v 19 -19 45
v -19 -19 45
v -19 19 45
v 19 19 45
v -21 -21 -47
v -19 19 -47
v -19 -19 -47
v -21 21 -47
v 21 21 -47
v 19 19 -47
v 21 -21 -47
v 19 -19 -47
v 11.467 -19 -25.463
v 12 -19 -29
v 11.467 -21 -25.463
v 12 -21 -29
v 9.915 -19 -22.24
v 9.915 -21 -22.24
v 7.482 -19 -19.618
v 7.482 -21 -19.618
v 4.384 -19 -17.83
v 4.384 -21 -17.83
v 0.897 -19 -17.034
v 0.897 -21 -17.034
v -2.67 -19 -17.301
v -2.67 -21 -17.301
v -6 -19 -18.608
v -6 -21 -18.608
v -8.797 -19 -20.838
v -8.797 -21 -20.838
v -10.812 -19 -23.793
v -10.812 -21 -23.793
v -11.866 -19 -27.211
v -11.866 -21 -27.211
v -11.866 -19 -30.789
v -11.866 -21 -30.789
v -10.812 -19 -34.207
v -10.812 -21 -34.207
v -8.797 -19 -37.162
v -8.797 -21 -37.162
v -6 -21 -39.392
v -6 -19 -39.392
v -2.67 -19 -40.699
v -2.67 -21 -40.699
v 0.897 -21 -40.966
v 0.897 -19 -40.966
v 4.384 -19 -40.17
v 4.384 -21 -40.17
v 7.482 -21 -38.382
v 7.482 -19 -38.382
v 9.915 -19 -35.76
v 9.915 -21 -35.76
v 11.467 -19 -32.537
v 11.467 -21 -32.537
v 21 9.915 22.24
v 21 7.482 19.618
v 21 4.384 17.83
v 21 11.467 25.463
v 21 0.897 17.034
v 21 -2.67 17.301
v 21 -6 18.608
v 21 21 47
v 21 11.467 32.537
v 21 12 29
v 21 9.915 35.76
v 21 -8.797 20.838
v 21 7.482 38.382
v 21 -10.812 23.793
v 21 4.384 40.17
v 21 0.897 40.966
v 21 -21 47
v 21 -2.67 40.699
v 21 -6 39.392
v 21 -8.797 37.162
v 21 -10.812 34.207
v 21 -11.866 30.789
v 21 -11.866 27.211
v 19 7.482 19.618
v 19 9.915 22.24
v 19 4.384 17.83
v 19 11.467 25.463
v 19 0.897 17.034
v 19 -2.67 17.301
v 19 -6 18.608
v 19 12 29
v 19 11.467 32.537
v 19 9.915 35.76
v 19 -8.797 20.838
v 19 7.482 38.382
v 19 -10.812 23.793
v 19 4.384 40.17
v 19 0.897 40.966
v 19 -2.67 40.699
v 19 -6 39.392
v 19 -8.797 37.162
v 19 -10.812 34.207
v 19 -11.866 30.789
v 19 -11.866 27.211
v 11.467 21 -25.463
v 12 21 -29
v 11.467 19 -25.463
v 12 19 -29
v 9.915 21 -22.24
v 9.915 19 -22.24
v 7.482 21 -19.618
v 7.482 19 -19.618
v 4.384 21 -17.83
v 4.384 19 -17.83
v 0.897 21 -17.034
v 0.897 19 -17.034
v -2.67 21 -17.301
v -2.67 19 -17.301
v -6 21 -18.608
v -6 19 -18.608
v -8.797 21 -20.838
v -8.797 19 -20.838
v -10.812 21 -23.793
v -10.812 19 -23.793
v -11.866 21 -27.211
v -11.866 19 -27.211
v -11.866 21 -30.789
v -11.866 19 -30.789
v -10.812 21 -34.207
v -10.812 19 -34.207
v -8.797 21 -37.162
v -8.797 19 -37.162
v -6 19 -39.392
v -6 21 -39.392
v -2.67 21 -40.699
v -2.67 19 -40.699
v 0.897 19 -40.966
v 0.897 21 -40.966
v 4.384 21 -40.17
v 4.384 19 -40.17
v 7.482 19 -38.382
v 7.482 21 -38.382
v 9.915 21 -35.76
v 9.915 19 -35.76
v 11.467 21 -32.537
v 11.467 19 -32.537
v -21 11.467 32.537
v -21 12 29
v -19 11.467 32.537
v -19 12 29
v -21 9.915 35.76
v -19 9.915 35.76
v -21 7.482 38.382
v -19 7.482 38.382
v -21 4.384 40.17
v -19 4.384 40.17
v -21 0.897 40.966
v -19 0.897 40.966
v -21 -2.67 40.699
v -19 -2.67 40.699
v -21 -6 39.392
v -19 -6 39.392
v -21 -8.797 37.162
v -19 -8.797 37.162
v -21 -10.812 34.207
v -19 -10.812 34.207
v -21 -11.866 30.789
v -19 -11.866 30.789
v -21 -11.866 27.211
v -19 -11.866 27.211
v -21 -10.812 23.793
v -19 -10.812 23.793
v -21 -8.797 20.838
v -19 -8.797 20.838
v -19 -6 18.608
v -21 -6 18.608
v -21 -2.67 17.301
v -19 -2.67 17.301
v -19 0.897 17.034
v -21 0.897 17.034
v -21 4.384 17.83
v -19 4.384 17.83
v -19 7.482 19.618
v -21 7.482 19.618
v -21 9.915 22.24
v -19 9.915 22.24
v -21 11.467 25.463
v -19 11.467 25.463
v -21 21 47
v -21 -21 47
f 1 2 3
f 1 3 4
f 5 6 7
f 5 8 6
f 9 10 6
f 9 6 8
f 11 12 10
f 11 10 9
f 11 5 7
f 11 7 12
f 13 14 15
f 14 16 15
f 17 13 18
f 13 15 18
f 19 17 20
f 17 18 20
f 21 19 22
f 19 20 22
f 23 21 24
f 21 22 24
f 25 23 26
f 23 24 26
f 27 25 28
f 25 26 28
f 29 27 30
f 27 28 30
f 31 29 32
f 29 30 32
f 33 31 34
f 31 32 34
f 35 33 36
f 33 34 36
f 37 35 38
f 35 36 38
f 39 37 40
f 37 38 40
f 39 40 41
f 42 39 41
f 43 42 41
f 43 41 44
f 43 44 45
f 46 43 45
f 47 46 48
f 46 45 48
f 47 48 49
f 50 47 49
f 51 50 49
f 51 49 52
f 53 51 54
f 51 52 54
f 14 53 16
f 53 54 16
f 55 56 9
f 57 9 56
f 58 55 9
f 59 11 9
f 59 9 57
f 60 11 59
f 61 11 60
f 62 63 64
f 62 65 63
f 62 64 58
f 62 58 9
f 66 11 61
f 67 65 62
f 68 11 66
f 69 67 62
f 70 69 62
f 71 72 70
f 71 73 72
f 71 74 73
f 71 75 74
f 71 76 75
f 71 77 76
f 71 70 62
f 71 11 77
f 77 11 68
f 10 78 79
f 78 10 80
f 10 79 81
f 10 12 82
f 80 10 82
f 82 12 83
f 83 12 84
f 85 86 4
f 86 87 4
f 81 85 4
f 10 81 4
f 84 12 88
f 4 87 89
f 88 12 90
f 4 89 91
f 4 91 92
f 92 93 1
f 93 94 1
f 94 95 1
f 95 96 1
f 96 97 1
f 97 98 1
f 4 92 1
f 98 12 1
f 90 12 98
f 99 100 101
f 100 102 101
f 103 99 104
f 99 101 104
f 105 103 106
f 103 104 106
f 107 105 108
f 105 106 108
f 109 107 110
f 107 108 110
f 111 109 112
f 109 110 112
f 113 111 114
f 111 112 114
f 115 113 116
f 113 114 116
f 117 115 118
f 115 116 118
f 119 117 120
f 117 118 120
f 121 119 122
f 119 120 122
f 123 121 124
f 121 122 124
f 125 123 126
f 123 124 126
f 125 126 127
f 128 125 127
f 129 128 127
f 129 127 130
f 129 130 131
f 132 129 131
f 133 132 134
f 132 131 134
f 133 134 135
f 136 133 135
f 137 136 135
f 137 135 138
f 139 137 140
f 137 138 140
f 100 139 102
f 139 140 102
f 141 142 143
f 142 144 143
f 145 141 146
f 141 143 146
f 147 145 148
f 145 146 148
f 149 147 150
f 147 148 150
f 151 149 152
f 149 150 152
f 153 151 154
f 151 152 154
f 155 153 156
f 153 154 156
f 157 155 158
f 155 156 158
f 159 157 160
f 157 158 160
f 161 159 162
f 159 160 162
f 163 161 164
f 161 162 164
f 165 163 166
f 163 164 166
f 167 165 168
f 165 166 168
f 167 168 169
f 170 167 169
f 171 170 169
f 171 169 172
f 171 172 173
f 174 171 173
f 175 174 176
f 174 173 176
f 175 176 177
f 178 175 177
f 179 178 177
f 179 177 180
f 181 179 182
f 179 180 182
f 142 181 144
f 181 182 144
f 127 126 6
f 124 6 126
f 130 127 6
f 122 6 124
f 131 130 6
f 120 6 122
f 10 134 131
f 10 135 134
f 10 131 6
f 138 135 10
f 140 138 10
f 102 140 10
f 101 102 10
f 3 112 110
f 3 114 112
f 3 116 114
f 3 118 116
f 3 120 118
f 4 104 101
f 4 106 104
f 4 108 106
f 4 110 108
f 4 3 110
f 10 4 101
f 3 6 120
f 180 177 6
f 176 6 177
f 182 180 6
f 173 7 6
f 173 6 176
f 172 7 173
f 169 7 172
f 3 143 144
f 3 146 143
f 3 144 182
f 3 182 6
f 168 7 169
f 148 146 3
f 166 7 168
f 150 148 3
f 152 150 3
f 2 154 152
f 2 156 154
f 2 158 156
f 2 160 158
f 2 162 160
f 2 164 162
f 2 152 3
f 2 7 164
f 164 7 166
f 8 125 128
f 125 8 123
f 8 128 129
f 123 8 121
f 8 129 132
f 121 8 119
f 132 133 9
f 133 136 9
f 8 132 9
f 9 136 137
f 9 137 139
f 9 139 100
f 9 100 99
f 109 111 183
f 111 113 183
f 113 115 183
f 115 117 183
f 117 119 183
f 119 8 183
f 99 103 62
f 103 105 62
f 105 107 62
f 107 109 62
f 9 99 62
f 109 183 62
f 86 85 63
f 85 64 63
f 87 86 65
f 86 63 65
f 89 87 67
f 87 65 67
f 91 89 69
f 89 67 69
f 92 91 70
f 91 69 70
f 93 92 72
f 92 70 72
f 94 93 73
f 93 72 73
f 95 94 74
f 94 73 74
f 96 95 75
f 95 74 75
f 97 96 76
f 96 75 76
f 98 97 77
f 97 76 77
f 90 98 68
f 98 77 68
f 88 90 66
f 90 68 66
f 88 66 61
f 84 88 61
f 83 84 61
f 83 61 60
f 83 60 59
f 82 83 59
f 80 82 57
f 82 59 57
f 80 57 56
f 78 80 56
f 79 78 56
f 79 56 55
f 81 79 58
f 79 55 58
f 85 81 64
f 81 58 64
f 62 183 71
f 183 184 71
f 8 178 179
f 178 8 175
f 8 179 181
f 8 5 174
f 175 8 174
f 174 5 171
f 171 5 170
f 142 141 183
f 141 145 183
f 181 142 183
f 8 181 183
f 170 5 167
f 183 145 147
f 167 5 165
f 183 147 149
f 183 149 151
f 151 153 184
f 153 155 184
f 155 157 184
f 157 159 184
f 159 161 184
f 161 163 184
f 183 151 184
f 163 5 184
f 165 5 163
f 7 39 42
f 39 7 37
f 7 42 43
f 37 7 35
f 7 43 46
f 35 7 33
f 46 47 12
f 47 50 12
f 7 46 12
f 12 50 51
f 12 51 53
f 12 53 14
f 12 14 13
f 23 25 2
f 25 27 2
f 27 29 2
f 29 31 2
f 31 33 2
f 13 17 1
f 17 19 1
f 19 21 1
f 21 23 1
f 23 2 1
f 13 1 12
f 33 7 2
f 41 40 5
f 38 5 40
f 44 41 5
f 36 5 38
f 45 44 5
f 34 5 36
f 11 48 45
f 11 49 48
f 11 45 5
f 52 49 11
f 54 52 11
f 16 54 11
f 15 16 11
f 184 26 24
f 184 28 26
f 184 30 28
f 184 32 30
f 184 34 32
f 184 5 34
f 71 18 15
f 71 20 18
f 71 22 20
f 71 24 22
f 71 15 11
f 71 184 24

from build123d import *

# Parameters (mm, degrees)
F0_W     = 42
F0_H     = 94
F1_DEPTH = 21
F3_T     = -2
F2_R     = 12
F4_DEPTH = 38.1
F5_R     = 12
F6_DEPTH = 38.1


with BuildPart() as f1:
    # F0 (on Front) → F1 (new body, symmetric)
    with BuildSketch(Plane.XZ):
        Rectangle(F0_W, F0_H)
    extrude(amount=F1_DEPTH, both=True)

    # F3
    f3_openings = [f1.faces().sort_by_distance(p)[0] for p in [
        (0, 0, -47),
    ]]
    offset(amount=F3_T, openings=f3_openings)

    # F2 (on Front) → F4 (cut, symmetric)
    with BuildSketch(Plane.XZ):
        with Locations((0, -29)):
            Circle(F2_R)
    extrude(amount=F4_DEPTH, both=True, mode=Mode.SUBTRACT)

    # F5 (on Right) → F6 (cut, symmetric)
    with BuildSketch(Plane.YZ):
        with Locations((0, 29)):
            Circle(F5_R)
    extrude(amount=F6_DEPTH, both=True, mode=Mode.SUBTRACT)


solid = f1.part
